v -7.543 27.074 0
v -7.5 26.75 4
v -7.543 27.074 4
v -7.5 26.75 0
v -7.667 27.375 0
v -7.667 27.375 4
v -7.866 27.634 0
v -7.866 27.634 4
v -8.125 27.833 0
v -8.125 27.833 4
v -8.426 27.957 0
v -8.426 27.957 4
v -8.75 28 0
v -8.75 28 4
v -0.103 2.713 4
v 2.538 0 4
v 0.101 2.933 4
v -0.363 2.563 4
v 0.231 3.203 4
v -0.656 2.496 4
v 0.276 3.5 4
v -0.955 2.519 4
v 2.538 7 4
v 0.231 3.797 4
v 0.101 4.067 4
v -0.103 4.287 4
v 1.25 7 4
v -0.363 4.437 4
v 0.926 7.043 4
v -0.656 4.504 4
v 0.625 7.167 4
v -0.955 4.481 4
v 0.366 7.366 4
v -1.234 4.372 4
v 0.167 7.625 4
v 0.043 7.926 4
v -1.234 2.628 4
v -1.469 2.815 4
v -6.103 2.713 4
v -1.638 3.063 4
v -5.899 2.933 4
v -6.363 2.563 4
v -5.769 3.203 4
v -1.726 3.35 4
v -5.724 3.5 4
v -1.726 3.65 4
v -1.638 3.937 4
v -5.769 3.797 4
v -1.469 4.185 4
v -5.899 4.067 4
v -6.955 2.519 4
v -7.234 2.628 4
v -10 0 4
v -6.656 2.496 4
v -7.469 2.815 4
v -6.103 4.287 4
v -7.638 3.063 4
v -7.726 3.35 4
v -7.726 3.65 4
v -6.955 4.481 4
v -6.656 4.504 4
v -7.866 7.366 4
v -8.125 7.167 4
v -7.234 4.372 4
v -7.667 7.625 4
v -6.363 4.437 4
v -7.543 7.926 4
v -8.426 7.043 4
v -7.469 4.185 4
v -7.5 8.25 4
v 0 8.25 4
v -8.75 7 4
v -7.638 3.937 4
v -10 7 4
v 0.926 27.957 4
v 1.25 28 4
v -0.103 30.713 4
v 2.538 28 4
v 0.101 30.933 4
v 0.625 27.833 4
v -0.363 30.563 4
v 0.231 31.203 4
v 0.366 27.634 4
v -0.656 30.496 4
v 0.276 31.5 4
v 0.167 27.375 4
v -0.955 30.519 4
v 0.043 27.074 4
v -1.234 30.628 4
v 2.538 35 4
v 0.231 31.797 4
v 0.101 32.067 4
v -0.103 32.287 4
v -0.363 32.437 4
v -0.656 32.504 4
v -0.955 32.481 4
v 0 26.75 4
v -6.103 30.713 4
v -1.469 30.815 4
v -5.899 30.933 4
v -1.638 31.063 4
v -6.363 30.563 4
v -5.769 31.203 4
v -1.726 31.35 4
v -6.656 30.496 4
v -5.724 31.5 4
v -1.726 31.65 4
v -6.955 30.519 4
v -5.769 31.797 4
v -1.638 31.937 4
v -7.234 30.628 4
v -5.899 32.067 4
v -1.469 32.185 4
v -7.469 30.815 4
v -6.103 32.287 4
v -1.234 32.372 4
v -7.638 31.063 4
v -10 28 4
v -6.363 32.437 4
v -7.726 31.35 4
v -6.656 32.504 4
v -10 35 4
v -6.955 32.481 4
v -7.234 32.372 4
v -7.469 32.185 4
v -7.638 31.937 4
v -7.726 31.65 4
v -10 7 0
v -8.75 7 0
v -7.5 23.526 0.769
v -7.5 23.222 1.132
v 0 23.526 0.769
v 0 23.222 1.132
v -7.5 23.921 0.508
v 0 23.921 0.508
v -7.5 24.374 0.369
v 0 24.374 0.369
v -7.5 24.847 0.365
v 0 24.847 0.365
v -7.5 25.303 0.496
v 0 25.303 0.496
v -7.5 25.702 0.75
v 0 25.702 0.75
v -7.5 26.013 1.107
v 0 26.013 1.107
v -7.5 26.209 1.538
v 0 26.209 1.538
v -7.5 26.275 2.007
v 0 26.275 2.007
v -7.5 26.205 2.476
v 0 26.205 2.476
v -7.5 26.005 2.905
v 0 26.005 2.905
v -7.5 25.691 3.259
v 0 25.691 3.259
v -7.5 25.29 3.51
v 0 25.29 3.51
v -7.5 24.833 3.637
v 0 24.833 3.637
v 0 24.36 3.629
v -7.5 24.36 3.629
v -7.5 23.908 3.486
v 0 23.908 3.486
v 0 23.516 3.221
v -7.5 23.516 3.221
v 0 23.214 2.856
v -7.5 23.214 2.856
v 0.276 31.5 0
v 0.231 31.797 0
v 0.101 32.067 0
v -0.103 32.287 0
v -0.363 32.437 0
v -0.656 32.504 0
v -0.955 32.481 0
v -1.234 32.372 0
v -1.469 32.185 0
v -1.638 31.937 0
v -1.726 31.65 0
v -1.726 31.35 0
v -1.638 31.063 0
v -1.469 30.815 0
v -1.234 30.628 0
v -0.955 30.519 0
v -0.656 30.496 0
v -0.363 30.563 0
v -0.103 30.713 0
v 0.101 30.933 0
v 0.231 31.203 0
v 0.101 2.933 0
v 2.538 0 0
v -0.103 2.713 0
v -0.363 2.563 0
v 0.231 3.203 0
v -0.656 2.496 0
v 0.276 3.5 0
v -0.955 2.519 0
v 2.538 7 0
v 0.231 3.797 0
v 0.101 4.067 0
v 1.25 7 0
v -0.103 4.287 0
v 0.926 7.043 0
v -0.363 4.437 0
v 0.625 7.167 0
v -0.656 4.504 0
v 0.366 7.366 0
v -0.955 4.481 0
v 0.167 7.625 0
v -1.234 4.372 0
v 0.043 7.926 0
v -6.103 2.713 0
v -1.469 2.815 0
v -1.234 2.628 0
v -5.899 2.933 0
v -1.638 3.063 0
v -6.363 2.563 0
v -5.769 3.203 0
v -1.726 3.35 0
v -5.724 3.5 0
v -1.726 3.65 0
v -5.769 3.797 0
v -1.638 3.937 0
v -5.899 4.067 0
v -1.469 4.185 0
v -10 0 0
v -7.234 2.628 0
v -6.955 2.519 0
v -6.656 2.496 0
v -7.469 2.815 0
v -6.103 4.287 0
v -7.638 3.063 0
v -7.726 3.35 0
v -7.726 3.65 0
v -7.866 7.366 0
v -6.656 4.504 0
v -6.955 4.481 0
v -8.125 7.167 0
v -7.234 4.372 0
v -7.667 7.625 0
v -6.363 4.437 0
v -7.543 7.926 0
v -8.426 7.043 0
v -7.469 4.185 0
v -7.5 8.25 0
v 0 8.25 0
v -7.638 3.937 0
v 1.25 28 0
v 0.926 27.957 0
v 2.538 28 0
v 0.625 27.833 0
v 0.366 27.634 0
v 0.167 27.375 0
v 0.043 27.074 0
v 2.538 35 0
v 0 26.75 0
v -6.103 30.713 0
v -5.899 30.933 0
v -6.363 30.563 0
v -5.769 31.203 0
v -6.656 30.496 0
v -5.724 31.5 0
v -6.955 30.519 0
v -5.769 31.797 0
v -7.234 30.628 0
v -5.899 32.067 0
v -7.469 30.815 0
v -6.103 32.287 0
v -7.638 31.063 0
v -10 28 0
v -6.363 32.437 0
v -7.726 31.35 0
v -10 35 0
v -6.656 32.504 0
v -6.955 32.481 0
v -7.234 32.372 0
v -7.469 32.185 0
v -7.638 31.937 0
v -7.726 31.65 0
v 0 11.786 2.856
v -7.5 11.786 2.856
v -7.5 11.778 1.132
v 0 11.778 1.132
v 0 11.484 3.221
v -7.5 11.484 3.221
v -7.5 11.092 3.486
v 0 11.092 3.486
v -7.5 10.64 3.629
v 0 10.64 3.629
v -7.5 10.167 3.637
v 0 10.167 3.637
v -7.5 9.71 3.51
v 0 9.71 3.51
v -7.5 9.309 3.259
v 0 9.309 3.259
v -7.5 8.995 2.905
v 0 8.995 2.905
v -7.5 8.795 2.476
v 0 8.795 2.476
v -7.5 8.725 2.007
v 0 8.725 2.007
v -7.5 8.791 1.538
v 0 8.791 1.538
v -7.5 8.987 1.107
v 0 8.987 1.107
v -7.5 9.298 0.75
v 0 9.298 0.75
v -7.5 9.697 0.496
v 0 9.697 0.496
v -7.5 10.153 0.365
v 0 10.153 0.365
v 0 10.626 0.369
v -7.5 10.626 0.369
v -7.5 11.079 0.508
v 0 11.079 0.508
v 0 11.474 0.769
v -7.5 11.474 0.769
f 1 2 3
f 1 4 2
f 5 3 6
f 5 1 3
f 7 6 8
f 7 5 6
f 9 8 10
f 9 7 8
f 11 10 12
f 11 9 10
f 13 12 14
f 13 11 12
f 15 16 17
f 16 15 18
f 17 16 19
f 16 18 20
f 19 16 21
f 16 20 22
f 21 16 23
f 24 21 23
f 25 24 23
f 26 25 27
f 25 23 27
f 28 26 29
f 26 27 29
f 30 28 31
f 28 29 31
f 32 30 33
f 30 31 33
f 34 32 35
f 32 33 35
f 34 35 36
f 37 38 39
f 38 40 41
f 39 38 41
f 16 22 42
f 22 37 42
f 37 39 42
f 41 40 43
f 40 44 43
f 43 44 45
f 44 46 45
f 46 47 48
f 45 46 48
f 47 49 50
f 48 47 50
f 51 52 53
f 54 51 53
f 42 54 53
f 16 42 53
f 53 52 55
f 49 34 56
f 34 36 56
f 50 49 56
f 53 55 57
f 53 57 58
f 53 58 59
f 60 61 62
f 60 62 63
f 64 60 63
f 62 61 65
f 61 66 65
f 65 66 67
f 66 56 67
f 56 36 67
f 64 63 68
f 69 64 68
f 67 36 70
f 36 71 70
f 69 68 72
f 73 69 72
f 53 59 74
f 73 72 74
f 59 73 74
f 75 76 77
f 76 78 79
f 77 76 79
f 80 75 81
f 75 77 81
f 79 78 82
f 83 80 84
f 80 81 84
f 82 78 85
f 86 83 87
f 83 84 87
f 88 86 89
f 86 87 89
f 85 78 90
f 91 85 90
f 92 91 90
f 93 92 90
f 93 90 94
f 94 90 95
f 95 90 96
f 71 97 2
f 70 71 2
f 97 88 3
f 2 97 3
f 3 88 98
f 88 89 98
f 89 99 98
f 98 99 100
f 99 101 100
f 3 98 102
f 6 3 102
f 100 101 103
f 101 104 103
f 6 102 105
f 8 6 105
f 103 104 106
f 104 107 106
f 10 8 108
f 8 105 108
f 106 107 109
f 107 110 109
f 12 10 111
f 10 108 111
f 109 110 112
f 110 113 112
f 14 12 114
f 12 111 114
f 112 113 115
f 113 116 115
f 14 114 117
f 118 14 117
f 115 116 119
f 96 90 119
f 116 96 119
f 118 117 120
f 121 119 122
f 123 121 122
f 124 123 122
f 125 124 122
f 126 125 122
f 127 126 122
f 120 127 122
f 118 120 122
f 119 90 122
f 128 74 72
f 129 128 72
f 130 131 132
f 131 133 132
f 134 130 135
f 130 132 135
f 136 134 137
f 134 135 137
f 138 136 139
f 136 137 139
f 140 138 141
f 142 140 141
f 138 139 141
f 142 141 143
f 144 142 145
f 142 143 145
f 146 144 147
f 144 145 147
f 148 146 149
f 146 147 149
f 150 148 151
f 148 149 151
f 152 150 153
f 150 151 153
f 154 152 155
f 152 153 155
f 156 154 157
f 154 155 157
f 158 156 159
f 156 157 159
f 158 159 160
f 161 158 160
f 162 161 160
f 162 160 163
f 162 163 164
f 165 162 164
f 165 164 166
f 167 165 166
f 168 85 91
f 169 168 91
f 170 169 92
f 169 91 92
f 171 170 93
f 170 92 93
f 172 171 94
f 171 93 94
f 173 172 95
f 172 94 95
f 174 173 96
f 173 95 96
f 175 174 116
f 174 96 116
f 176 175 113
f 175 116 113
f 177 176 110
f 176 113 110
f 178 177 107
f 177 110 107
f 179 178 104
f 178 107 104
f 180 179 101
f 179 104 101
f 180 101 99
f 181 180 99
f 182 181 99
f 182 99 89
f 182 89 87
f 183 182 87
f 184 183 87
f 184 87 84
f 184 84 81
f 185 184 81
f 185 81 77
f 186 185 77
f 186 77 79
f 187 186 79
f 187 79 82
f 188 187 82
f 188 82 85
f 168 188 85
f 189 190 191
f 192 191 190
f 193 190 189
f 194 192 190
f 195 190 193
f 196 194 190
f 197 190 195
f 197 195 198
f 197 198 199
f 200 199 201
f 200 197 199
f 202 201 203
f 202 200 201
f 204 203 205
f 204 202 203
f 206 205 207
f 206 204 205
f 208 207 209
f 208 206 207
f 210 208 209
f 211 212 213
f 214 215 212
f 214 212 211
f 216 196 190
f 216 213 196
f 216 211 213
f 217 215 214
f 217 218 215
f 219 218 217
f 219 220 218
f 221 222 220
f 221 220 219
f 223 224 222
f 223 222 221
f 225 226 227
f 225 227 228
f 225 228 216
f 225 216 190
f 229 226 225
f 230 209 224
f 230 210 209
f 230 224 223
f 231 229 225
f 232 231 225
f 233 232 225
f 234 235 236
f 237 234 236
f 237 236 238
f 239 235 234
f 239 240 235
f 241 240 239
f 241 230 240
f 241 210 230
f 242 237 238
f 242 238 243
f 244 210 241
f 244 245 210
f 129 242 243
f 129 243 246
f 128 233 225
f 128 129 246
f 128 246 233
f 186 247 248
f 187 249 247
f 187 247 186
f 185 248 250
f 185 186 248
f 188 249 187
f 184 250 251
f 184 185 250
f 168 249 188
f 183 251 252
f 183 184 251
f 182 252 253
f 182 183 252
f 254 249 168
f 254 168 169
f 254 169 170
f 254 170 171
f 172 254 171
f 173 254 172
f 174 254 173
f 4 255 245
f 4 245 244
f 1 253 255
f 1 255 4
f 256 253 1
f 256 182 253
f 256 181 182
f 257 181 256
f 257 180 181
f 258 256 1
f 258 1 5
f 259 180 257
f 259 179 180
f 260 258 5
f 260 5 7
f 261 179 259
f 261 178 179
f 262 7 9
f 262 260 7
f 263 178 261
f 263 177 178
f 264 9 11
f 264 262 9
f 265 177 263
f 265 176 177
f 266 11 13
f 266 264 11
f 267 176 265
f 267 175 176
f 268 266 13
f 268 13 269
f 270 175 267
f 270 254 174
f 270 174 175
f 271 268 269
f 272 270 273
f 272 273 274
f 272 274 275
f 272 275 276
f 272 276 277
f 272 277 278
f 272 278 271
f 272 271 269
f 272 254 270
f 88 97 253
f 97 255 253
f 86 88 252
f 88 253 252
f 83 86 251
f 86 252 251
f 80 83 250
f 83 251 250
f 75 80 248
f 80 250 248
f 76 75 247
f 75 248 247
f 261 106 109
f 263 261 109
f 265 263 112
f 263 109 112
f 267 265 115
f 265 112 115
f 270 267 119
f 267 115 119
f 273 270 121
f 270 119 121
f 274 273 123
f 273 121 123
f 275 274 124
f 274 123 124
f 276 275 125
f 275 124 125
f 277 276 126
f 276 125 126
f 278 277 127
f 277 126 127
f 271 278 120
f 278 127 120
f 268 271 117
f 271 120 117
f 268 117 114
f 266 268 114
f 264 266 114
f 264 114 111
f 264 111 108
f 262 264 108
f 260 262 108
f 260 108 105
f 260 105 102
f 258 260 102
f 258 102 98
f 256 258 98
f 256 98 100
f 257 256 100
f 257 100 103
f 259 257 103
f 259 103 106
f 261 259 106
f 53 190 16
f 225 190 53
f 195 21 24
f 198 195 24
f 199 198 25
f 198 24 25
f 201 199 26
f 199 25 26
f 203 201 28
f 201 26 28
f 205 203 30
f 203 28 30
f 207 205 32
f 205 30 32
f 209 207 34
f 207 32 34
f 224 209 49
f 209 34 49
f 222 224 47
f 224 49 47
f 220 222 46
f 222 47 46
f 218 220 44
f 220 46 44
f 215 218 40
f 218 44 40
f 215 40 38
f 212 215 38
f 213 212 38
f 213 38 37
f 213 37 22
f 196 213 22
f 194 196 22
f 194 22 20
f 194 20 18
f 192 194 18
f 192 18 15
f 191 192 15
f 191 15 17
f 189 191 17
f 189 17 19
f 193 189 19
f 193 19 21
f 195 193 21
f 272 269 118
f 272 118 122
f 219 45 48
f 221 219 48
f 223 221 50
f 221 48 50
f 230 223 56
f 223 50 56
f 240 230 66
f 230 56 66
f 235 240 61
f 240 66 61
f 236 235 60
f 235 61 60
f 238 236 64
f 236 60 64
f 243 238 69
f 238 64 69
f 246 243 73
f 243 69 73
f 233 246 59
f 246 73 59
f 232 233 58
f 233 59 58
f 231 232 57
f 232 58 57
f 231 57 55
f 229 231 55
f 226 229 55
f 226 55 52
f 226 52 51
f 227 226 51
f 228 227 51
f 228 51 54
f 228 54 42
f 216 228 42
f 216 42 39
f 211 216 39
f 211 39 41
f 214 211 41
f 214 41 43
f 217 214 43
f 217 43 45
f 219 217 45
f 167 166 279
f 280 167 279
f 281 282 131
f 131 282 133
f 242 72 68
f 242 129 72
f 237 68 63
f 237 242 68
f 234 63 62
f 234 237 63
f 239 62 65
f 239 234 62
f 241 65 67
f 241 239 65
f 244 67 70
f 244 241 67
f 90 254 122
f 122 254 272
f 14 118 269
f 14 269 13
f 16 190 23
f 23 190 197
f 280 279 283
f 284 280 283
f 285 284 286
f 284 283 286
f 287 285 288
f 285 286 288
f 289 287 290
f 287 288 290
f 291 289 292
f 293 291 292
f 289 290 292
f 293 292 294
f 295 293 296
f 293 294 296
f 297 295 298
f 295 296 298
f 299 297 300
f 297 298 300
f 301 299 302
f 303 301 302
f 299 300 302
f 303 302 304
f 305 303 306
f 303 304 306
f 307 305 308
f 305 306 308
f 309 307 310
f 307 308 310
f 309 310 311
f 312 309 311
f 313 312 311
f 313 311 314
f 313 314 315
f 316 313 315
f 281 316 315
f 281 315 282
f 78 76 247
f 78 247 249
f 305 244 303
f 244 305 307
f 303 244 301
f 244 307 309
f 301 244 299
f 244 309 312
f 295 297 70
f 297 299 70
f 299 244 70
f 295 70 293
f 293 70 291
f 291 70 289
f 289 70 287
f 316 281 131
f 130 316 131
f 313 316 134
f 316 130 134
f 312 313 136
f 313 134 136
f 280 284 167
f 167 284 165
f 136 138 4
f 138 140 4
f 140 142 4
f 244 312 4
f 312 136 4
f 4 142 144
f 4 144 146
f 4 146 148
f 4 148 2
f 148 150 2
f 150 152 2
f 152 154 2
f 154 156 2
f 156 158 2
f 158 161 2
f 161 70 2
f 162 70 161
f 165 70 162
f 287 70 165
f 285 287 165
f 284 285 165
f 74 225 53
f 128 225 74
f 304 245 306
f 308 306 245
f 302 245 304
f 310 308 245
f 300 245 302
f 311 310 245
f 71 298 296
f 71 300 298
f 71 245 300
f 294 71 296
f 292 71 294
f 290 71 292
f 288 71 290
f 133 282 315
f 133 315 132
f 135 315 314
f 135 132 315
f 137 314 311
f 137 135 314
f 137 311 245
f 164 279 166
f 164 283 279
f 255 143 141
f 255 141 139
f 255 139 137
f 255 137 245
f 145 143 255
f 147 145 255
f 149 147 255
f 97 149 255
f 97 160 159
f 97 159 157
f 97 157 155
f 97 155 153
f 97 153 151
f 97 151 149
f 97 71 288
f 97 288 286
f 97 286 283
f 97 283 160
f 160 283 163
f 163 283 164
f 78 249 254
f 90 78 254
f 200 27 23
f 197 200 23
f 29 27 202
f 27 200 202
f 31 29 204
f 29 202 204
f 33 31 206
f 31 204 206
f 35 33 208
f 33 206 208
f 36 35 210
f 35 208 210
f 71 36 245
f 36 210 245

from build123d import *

# Parameters (mm, degrees)
SKETCH1_W           = 12.538434267
SKETCH1_H           = 35
BOSS_EXTRUDE1_DEPTH = 4
SKETCH2_W           = 2.538434267
SKETCH2_H           = 21
CUT_EXTRUDE1_DEPTH  = 37.619666847
SKETCH3_W           = 2.5
SKETCH3_H           = 21
CUT_EXTRUDE2_DEPTH  = 37.619666847
CUT_EXTRUDE3_DEPTH  = 37.619666847
SKETCH5_W           = 7.5
SKETCH5_H           = 1.65
SKETCH6_W           = 7.5
SKETCH6_H           = 1.65
HOLE1_D             = 2.013
FILLET1_R           = 1.25


with BuildPart() as part:
    # Sketch1 → Boss-Extrude1 (new body)
    with BuildSketch(Plane(origin=(0, 0, 0), x_dir=(-1, 0, 0), z_dir=(0, 0, -1))):
        with Locations((3.730782867, 17.5)):
            Rectangle(SKETCH1_W, SKETCH1_H)
    extrude(amount=-BOSS_EXTRUDE1_DEPTH)

    # Sketch2 → Cut-Extrude1 (cut, through all)
    with BuildSketch(Plane.XY.offset(4)):
        with Locations((1.269217133, 17.5)):
            Rectangle(SKETCH2_W, SKETCH2_H)
    extrude(amount=-CUT_EXTRUDE1_DEPTH, mode=Mode.SUBTRACT)

    # Sketch3 → Cut-Extrude2 (cut, through all)
    with BuildSketch(Plane.XY.offset(4)):
        with Locations((-8.75, 17.5)):
            Rectangle(SKETCH3_W, SKETCH3_H)
    extrude(amount=-CUT_EXTRUDE2_DEPTH, mode=Mode.SUBTRACT)

    # Sketch4 → Cut-Extrude3 (cut, through all)
    with BuildSketch(Plane(origin=(0, 0, 0), x_dir=(0, 0, -1), z_dir=(1, 0, 0))):
        with BuildLine():
            Line((-2.855933763, 23.21436986), (-2.855933763, 11.78563014))
            ThreePointArc((-2.855933763, 11.78563014), (-1.992824856, 12.024984399), (-1.13183027, 11.778132681))
            Line((-1.13183027, 11.778132681), (-1.13183027, 23.221867319))
            ThreePointArc((-1.13183027, 23.221867319), (-1.992824856, 22.975015601), (-2.855933763, 23.21436986))
        make_face()
    extrude(amount=-CUT_EXTRUDE3_DEPTH, mode=Mode.SUBTRACT)

    # Sketch5 → Cut-Revolve1 (revolve, cut)
    with BuildSketch(Plane.XY.offset(2)):
        with Locations((-3.75, 11.2)):
            Rectangle(SKETCH5_W, SKETCH5_H)
    revolve(axis=Axis((-7.5, 10.375, 2), (1, 0, 0)), mode=Mode.SUBTRACT)

    # Sketch6 → Cut-Revolve2 (revolve, cut)
    with BuildSketch(Plane.XY.offset(2)):
        with Locations((-3.75, 25.45)):
            Rectangle(SKETCH6_W, SKETCH6_H)
    revolve(axis=Axis((-7.5, 24.625, 2), (1, 0, 0)), mode=Mode.SUBTRACT)

    # Hole1 (through all)
    with Locations(Plane(origin=(0, 0, 0), x_dir=(-1, 0, 0), z_dir=(0, 0, -1))):
        with Locations((0.730782866, 3.5), (6.730782866, 3.5), (0.730782866, 31.5), (6.730782866, 31.5)):
            Hole(HOLE1_D / 2)

    # Fillet1
    fillet1_edges = [part.edges().sort_by_distance(p)[0] for p in [
        (0, 7, 2),
        (0, 28, 2),
        (-7.5, 28, 2),
        (-7.5, 7, 2),
    ]]
    fillet(fillet1_edges, radius=FILLET1_R)


solid = part.part
